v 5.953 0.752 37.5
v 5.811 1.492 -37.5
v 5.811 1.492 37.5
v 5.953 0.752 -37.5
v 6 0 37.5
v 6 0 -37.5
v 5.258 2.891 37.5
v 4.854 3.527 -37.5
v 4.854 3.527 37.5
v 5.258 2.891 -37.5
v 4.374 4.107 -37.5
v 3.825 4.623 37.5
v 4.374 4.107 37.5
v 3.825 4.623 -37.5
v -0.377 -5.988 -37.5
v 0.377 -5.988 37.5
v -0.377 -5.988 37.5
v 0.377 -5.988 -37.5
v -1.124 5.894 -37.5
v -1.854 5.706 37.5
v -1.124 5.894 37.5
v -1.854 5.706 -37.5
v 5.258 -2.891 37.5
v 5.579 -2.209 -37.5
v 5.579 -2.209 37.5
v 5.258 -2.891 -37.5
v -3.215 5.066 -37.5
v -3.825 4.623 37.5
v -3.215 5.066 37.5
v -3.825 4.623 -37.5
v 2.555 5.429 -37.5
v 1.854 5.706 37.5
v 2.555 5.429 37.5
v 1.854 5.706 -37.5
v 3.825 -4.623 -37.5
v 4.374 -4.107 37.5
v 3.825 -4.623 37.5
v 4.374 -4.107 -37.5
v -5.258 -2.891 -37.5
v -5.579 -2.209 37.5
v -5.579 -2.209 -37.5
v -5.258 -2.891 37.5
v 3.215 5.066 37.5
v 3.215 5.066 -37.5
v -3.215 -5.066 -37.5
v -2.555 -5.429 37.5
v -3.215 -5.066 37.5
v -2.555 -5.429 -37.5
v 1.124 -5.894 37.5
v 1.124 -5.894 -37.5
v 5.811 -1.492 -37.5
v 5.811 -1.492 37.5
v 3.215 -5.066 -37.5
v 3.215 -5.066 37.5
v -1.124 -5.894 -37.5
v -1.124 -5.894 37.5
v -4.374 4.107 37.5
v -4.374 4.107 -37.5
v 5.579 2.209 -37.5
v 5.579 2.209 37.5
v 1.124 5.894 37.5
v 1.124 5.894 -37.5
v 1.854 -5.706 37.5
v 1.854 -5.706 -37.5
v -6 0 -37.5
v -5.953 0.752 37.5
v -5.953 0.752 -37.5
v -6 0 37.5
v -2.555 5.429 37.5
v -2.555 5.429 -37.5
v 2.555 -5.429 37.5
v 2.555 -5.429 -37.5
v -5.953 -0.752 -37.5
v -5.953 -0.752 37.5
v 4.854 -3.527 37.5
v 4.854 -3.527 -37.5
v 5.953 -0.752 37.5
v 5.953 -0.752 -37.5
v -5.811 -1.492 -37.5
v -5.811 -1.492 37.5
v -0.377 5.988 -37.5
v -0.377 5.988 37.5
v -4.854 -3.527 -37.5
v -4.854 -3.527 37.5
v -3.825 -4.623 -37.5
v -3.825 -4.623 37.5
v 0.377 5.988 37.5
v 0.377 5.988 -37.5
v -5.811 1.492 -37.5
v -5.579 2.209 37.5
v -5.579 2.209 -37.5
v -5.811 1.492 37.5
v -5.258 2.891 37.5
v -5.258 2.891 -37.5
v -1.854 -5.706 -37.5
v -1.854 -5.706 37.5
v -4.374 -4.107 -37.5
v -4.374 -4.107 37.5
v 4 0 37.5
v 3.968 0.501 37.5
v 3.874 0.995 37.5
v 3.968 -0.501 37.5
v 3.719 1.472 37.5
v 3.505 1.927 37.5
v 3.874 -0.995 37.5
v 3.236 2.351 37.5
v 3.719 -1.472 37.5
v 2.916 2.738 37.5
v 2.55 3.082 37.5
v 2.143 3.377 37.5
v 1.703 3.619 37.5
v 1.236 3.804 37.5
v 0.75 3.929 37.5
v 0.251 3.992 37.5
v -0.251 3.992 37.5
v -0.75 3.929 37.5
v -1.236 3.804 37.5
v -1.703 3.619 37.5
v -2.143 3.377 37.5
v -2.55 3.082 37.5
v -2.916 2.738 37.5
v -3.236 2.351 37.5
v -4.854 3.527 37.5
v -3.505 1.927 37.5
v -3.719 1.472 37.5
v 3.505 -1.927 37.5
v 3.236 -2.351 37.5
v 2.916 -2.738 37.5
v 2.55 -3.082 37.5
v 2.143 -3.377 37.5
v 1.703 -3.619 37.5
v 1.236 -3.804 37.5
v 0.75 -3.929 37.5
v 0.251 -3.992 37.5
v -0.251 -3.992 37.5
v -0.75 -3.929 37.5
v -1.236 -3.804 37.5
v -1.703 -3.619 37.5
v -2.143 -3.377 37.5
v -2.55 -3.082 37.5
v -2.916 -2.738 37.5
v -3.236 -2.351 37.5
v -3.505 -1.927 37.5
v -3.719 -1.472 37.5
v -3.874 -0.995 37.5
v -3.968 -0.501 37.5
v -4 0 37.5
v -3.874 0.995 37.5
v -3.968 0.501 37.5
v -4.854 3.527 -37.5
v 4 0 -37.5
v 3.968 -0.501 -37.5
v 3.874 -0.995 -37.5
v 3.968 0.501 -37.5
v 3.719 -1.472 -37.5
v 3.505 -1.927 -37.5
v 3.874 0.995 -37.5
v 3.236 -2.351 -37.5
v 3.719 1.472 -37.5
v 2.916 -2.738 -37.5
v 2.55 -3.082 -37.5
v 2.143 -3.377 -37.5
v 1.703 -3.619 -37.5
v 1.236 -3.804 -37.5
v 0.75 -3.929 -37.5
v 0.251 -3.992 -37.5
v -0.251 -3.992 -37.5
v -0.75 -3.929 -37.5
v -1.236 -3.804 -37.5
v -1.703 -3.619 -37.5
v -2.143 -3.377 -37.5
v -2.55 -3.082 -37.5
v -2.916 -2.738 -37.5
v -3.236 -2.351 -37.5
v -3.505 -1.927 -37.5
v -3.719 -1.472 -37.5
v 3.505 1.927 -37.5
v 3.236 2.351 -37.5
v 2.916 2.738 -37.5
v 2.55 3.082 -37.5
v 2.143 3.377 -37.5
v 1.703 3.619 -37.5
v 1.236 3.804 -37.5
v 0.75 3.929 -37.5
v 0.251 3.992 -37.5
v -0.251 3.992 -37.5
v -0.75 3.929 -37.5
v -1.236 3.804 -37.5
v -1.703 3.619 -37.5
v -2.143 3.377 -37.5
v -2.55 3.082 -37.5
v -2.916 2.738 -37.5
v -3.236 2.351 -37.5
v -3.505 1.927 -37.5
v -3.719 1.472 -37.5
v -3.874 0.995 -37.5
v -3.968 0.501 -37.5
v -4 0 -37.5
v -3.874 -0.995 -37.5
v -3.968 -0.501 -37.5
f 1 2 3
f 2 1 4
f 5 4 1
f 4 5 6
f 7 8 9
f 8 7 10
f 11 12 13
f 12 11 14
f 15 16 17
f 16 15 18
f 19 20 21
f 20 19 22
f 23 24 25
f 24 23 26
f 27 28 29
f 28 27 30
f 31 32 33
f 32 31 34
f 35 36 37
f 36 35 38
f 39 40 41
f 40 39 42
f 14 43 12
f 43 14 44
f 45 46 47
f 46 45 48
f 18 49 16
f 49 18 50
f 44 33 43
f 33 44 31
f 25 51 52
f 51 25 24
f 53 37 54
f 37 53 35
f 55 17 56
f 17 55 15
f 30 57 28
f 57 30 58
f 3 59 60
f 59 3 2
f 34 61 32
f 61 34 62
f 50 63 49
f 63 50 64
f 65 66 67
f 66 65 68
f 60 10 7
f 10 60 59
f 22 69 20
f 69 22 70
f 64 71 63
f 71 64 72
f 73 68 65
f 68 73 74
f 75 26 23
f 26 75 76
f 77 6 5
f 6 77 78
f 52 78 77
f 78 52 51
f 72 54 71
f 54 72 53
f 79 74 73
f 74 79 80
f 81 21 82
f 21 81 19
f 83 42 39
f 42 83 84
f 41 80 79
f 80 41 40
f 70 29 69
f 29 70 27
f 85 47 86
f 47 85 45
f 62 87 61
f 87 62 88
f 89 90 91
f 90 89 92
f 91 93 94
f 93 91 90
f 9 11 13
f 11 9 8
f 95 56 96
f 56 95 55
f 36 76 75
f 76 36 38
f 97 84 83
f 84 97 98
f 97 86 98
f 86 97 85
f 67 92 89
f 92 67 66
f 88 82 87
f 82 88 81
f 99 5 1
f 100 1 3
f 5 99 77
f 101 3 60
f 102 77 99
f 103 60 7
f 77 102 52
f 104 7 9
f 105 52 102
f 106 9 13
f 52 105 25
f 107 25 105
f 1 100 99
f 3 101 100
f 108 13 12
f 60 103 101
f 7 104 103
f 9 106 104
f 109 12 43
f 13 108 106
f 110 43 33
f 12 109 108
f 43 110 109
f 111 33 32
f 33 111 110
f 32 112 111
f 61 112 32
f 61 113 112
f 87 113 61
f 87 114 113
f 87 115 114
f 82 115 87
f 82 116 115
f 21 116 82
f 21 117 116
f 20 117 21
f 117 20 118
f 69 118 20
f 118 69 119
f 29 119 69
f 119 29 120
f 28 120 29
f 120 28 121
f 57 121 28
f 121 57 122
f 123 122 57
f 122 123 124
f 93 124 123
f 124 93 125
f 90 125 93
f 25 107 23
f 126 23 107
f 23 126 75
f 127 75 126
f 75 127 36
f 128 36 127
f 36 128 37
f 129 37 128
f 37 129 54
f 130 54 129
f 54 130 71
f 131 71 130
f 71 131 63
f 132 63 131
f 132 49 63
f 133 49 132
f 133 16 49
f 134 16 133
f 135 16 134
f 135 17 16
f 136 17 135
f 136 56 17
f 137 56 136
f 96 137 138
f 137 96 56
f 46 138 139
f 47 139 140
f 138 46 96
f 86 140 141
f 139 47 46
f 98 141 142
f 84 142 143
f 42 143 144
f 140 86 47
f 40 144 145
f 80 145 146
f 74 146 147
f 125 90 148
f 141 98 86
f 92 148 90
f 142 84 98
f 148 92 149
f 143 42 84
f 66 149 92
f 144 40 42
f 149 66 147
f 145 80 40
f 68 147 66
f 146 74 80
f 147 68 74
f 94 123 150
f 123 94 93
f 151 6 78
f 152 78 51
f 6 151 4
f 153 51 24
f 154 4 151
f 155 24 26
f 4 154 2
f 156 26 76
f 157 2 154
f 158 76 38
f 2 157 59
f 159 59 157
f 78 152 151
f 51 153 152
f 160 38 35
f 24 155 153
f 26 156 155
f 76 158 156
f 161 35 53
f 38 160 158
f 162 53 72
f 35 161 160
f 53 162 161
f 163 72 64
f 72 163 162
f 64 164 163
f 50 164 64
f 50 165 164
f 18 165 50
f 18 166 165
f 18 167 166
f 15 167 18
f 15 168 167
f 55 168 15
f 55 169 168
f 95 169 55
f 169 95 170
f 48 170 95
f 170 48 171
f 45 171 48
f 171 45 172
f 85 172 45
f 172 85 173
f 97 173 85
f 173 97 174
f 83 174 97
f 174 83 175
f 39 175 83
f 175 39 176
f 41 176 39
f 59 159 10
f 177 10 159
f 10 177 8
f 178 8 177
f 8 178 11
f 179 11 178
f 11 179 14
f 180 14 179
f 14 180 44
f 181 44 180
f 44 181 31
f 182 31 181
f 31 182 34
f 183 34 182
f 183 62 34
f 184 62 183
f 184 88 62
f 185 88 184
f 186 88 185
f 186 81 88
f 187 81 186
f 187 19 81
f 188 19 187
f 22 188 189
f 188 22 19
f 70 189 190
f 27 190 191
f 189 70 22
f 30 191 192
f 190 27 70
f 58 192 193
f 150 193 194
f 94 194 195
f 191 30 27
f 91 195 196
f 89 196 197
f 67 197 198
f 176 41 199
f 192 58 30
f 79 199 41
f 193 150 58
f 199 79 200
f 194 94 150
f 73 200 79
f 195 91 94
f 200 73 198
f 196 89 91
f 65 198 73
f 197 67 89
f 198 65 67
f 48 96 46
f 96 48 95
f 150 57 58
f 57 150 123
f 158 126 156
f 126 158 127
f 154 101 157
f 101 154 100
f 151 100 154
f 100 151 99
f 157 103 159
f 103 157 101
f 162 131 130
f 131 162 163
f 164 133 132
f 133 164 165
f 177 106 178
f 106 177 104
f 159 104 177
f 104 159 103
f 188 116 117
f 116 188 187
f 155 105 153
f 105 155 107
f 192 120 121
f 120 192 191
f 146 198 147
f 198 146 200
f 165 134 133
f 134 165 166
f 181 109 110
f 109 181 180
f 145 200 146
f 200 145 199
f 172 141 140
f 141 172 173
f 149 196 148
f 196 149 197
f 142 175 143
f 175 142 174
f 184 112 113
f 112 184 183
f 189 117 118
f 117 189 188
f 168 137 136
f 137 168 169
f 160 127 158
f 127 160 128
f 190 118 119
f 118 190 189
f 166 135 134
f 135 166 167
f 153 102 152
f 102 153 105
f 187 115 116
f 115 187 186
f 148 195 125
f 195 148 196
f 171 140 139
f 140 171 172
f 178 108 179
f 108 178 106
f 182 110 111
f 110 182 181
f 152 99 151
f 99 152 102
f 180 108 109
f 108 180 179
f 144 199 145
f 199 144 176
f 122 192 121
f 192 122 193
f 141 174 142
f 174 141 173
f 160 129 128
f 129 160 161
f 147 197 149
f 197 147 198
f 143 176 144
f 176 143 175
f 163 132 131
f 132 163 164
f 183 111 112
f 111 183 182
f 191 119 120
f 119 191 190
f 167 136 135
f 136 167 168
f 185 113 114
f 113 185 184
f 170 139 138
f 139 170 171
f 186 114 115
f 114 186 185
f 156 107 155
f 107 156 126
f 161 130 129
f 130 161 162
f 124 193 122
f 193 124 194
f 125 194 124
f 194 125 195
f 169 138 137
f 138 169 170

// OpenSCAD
$fn = 50;


difference() {
	union() {
		translate(v = [0, 0, -37.5000000000]) {
			cylinder(h = 75, r = 6.0000000000);
		}
	}
	union() {
		translate(v = [0, 0, -100.0000000000]) {
			cylinder(h = 200, r = 4.0000000000);
		}
	}
}
